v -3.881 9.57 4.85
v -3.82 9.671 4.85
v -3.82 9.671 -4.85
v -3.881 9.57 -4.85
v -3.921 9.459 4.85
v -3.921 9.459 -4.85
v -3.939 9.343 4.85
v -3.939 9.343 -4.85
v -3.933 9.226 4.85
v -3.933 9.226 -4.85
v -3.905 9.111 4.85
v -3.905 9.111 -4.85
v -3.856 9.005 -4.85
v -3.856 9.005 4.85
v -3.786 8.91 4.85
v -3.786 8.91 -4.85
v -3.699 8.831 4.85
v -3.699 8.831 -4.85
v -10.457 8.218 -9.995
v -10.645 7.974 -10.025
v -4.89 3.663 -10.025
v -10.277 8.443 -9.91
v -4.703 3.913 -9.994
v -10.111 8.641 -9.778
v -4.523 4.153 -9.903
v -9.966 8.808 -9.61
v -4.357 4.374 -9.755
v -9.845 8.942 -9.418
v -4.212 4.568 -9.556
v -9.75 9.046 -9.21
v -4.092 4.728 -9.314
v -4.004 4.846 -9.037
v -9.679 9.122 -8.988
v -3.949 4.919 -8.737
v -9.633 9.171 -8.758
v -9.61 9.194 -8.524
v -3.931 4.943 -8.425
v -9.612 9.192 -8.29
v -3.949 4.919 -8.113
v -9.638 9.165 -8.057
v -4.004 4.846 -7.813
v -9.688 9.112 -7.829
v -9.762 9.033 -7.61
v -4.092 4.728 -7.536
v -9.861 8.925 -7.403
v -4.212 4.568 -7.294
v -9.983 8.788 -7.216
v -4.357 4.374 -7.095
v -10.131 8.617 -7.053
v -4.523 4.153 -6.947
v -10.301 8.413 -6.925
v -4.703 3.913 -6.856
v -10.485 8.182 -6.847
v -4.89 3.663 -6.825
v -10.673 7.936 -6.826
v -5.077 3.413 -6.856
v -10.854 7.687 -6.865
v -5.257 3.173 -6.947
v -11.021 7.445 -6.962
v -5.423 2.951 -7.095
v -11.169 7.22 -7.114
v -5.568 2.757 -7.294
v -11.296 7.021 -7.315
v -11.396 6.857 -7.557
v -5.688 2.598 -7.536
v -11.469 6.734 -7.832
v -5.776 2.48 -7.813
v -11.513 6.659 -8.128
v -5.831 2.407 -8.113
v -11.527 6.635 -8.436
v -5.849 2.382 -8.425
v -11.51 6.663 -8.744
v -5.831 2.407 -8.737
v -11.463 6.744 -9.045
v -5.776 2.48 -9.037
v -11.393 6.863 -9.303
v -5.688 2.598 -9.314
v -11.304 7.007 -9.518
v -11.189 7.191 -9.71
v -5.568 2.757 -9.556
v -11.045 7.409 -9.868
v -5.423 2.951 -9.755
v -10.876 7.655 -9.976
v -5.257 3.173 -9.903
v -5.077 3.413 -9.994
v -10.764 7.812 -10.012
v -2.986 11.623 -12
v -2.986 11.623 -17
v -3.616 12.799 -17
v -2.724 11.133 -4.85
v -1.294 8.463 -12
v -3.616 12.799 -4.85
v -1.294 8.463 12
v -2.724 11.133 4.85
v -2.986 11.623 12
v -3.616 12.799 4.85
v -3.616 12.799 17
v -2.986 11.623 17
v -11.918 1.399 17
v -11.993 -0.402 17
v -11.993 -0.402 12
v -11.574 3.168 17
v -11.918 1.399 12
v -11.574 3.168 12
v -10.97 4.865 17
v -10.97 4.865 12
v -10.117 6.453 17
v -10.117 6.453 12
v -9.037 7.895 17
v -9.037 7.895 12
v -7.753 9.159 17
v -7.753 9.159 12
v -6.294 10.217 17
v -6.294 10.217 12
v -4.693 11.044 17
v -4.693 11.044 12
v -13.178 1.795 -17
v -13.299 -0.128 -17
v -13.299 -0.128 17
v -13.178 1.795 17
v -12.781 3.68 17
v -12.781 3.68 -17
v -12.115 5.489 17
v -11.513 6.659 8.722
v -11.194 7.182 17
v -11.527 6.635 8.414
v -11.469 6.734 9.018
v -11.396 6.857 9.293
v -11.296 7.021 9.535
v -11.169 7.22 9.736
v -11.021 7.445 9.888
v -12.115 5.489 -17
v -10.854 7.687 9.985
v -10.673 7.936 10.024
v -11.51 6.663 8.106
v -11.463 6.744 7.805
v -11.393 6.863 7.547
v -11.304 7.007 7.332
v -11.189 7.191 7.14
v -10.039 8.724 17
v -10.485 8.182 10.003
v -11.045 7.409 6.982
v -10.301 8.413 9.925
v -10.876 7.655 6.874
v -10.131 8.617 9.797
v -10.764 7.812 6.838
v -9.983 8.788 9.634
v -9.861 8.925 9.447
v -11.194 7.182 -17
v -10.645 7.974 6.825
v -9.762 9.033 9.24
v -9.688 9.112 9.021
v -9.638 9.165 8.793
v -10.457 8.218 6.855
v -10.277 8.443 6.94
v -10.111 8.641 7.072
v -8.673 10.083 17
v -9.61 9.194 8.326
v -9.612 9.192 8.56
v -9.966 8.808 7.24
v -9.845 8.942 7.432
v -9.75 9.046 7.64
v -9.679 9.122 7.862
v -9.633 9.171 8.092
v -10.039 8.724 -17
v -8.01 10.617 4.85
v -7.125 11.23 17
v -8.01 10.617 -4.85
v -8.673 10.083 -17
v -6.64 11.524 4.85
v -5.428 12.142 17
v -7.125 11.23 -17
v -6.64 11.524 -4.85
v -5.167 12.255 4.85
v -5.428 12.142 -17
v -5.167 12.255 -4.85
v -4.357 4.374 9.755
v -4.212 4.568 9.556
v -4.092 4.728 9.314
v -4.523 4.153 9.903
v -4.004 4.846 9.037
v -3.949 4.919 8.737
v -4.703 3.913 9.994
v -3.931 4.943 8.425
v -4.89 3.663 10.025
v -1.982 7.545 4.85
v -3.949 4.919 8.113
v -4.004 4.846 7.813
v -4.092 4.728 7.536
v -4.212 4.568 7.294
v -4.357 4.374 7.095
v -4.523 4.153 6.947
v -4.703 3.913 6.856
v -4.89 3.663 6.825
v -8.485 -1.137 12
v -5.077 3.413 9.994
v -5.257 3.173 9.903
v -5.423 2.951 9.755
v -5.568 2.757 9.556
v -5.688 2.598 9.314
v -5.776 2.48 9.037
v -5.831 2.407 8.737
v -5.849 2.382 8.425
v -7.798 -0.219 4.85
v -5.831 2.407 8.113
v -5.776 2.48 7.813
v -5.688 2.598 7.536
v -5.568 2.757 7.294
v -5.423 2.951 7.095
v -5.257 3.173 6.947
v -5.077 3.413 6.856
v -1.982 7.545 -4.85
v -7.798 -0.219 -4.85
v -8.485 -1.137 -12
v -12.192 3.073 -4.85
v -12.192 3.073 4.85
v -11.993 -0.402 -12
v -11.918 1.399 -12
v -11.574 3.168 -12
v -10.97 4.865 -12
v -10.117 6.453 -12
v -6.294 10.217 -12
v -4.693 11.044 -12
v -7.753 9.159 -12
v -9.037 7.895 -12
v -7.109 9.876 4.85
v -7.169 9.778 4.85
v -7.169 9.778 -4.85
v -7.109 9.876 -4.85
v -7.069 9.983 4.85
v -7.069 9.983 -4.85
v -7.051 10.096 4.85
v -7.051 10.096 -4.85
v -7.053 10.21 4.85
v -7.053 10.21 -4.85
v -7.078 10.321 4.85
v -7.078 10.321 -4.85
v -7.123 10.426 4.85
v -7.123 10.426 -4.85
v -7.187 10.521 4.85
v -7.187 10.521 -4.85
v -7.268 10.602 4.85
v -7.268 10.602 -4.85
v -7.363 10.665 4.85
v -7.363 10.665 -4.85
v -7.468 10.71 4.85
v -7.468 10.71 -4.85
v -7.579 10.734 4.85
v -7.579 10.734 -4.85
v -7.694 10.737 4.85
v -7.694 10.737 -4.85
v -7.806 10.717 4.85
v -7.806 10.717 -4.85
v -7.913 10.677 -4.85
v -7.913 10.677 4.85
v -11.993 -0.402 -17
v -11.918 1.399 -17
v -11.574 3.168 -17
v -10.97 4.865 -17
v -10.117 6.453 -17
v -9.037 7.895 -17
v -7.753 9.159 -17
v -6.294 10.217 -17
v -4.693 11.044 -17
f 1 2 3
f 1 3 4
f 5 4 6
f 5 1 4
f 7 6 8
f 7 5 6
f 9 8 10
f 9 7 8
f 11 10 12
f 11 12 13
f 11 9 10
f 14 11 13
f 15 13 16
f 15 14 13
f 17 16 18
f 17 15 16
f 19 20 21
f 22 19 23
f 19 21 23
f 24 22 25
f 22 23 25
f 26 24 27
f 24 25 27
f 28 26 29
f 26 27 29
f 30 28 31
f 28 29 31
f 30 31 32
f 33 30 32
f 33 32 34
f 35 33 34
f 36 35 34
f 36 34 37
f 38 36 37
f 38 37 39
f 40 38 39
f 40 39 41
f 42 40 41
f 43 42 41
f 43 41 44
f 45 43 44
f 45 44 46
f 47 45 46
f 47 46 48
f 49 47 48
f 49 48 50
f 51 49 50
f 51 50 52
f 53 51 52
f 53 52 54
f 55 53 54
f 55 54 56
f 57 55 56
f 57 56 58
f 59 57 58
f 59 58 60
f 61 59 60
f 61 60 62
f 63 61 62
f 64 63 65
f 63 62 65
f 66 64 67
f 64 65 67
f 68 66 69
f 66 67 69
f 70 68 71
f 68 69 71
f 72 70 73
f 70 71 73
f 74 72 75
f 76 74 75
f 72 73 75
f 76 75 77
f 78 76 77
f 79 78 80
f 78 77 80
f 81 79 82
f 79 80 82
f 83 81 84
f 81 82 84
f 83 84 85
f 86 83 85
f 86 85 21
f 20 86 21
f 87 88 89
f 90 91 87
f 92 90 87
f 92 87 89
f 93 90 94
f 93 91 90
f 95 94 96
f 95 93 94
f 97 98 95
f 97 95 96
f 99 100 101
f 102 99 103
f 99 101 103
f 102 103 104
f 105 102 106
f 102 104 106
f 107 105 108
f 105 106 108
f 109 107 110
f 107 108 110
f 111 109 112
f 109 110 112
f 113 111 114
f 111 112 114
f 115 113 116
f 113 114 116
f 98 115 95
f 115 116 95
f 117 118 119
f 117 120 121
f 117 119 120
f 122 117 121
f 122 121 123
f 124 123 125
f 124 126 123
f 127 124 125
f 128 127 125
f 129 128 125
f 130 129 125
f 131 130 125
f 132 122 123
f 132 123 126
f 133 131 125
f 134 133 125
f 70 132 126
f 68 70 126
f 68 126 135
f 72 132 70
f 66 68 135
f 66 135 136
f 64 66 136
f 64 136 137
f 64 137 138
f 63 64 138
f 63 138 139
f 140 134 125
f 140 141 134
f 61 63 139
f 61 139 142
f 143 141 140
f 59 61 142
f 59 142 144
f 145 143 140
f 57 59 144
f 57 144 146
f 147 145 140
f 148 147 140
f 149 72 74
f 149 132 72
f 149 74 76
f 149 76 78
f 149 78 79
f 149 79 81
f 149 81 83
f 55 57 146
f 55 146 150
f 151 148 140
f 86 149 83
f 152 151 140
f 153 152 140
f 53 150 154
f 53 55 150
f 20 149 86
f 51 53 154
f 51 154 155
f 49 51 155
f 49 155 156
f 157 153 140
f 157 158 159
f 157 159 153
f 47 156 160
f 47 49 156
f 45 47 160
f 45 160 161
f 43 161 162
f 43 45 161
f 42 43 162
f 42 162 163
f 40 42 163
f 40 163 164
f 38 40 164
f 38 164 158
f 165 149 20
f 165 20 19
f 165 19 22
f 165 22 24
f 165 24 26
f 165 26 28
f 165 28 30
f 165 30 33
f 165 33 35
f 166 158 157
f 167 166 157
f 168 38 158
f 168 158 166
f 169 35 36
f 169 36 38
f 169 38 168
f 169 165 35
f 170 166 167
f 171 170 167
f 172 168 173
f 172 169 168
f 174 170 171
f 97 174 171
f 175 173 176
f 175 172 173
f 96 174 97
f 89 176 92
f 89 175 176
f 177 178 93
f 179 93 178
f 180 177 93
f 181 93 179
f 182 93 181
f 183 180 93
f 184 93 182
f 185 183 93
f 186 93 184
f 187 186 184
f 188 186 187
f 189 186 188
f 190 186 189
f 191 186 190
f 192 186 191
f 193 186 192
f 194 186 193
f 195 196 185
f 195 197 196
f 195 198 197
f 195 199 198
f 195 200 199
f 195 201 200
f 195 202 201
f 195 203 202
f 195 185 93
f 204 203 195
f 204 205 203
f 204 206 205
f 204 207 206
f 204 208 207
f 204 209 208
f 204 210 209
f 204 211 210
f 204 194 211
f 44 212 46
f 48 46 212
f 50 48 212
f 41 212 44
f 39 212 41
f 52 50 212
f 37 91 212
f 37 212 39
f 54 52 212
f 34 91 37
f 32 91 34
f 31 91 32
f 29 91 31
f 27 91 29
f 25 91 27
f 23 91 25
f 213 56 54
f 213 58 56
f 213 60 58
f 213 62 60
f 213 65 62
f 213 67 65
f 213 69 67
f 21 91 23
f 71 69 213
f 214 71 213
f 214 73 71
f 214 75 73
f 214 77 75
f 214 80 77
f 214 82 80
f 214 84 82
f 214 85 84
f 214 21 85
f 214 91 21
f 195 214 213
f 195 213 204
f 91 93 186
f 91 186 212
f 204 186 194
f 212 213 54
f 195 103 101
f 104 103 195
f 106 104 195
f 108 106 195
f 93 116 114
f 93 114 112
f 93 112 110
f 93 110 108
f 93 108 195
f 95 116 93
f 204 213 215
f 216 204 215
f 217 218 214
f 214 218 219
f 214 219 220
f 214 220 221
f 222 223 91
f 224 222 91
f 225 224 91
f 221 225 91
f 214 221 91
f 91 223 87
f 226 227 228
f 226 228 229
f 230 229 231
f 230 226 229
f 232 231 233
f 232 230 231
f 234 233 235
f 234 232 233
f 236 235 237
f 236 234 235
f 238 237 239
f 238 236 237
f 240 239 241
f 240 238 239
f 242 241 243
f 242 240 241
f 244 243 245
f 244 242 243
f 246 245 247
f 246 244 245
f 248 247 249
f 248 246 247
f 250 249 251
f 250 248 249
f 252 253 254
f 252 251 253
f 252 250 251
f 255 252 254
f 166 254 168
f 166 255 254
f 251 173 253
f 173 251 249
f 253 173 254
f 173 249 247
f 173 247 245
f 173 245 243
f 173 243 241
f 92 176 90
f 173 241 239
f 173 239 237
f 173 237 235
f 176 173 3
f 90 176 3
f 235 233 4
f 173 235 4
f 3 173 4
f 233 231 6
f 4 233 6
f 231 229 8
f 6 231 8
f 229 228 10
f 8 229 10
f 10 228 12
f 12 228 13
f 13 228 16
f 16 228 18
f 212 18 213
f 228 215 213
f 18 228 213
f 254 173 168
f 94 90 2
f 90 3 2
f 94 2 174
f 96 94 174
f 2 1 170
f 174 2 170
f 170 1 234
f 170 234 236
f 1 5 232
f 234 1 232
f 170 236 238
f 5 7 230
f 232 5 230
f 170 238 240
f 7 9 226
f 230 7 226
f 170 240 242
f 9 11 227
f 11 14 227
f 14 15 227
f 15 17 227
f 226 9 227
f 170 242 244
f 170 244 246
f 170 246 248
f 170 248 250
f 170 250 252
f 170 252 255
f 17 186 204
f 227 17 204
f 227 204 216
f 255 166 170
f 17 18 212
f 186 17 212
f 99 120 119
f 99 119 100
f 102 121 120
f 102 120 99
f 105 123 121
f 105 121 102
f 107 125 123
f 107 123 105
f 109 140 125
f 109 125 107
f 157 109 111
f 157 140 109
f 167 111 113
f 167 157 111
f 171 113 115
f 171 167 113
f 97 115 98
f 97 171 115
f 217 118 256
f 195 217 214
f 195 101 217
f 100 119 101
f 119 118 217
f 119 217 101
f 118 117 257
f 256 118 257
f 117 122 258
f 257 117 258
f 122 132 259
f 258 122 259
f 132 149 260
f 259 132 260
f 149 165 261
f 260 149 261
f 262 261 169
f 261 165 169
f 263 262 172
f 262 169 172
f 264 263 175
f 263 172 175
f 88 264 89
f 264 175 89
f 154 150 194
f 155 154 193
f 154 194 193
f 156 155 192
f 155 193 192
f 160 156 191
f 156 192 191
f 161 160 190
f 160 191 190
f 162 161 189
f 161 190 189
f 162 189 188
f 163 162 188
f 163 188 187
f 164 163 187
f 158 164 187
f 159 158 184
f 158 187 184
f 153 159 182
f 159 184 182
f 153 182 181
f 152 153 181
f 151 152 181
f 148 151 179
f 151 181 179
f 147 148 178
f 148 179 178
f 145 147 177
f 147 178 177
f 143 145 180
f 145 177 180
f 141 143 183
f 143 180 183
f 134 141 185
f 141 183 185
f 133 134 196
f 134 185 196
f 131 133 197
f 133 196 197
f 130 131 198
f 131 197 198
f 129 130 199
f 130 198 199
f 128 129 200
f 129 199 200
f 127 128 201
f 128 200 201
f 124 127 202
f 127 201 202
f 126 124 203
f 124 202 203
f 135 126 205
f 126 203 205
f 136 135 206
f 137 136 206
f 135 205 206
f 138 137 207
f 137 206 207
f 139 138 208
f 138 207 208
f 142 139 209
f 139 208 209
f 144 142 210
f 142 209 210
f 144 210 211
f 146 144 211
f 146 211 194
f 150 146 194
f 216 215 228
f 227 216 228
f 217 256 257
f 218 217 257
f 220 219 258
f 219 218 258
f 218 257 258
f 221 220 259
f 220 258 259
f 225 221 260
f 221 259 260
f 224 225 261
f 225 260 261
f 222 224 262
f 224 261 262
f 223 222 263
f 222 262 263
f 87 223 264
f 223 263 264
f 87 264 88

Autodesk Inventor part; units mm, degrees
ref_plane "YZ Plane" through (0, 0, 0) normal (1, 0, 0) x (0, 1, 0)
ref_plane "XZ Plane" through (0, 0, 0) normal (0, 1, 0) x (-1, 0, 0)
ref_plane "XY Plane" through (0, 0, 0) normal (0, 0, 1) x (1, 0, 0)
sketch "Эскиз1" plane through (0, 0, 0) normal (0, 0, 1) x (1, 0, 0)
  arc A0 (-0.8919, 11.7662) -> (-11.5424, -2.4521) centre (0, 0) ccw projected
  line L0 (-0.016, 10.1696) -> (-9.7639, -2.8438) projected
  line L1 (-9.7639, -2.8438) -> (-12.4663, -6.4515) projected
  arc A1 (-0.8919, 11.7662) -> (-11.5424, -2.4521) centre (0, 0) ccw projected
  line L2 (2.8533, 14) -> (-0.016, 10.1696) projected
  arc A2 (-8.5159, 10.4752) -> (-12.3517, -5.4484) centre (0, 0) ccw projected
  circle A3 centre (0, 0) radius 13.5
  circle A4 centre (0, 0) radius 11.8
  circle A5 centre (0, 0) radius 13.3
  circle A6 centre (0, 0) radius 12
  line L3 (-8.1467, 14) -> (2.8533, 14) projected
  line L4 (-8.1467, 14) -> (-8.1467, 11.2511) projected
  arc A7 (-11.5424, -2.4521) -> (-9.7639, -2.8438) centre (-10.5642, -2.2443) ccw projected
  arc A8 (-0.016, 10.1696) -> (-0.8919, 11.7662) centre (-0.8163, 10.7691) ccw projected
  arc A9 (-8.5159, 10.4752) -> (-8.1467, 11.2511) centre (-9.1467, 11.2511) ccw projected
  arc A10 (-12.4663, -6.4515) -> (-12.3517, -5.4484) centre (-13.2667, -5.852) ccw projected
  arc A11 (-11.5424, -2.4521) -> (-9.7639, -2.8438) centre (-10.5642, -2.2443) ccw projected
  arc A12 (-0.016, 10.1696) -> (-0.8919, 11.7662) centre (-0.8163, 10.7691) ccw projected
  point P0 (1.1623, 11.7426)
  point P1 (2.3273, 13.2979)
  point P2 (-11.0819, -4.6034)
  point P3 (1.302, 11.9292)
  point P4 (2.1926, 13.118)
  point P5 (-11.9725, -5.7923)
  dimension "d1" = 0.2
  dimension "d2" = 0.2
extrude "Выдавливание1" add sketch "Эскиз1" along normal mid plane 34 contours A6 L1 A5 L2 picked at (-9.9488, 8.0267)
sketch "Эскиз2" plane through (0, 0, 0) normal (0, 0, 1) x (1, 0, 0)
  arc A0 (-0.8919, 11.7662) -> (-11.5424, -2.4521) centre (0, 0) ccw projected
  line L0 (-0.016, 10.1696) -> (-9.7639, -2.8438) projected
  arc A1 (1.302, 11.9292) -> (-11.0819, -4.6034) centre (0, 0) ccw projected
  line L1 (-14.5944, -9.2926) -> (2.8533, 14) projected
  arc A2 (-11.5424, -2.4521) -> (-9.7639, -2.8438) centre (-10.5642, -2.2443) ccw projected
  arc A3 (-0.016, 10.1696) -> (-0.8919, 11.7662) centre (-0.8163, 10.7691) ccw projected
  point P0 (1.1623, 11.7426)
  point P1 (-10.9422, -4.4168)
extrude "Выдавливание2" add sketch "Эскиз2" along normal mid plane 24
sketch "Эскиз3" plane through (0, 0, 0) normal (0, 0, 1) x (1, 0, 0)
  arc A0 (1.302, 11.9292) -> (-11.0819, -4.6034) centre (0, 0) ccw projected
  line L0 (-11.0819, -4.6034) -> (1.302, 11.9292) projected
  arc A1 (2.1926, 13.118) -> (-11.9725, -5.7923) centre (0, 0) ccw projected
  arc A2 (-8.5159, 10.4752) -> (-12.3517, -5.4484) centre (0, 0) ccw projected
  line L1 (1.302, 11.9292) -> (-11.0819, -4.6034) projected
  line L2 (-4.8899, 3.6629) -> (-10.8048, 8.0935)
  line L3 (-10.8048, 8.0935) -> (-8.8039, 6.5947)
  line L4 (-11.3519, 3.1932) -> (-6.256, 9.9963)
  line L5 (-6.256, 9.9963) -> (-2.2942, 7.0286)
  line L6 (-2.2942, 7.0286) -> (-7.3901, 0.2256)
  line L7 (-7.3901, 0.2256) -> (-11.3519, 3.1932)
  line L8 (-12.1918, 3.0727) -> (-6.3765, 10.8362)
  line L9 (-6.3765, 10.8362) -> (-1.4543, 7.1491)
  line L10 (-1.4543, 7.1491) -> (-7.2696, -0.6143)
  line L11 (-7.2696, -0.6143) -> (-12.1918, 3.0727)
  point P0 (-4.8422, 3.6271)
  dimension "d7" = 2.5
  dimension "d8" = 8.5
  dimension "d9" = 4.95
  dimension "d12" = 0.6
  dimension "d13" = 9.7
extrude "Выдавливание3" cut sketch "Эскиз3" along normal mid plane 9.7 contours L9 L0 L5 L4 L2 L8 A0 | A0 L8 L9 | L9 L10 L11 L0 L7 L6 L5 | L5 L6 L7 L0 | L0 L2 L4 L5 | L2 L4 L7 L0 L11 A0 L8 | L0 L7 L4 L2 | A0 L11 L8
sketch "Эскиз4" plane through (-1.9823, 7.5446, -4.85) normal (-0.5995217, -0.8003585, 0) x (0.8003585, -0.5995217, 0)
  line L0 (0, 9.7) -> (0, 0) projected
  line L1 (0, 9.7) -> (-5.4903, 9.7) projected
  line L2 (-5.4903, 0) -> (-5.4903, 9.7) projected
  line L3 (-5.4903, 0) -> (0, 0) projected
  line L4 (-5.4903, 9.7) -> (-2.7452, 9.7)
  line L5 (-2.7452, 0) -> (-2.7452, 9.7)
  point P0 (6.1097, 4.85)
extrude "Выдавливание4" cut sketch "Эскиз4" against normal blind 9.7 contours L5 L3 L2 L1
fillet "Сопряжение1" radius 0.6 3 edges at (-5.3836, 12.1617, 0) (-4.1794, 9.1904, 0) (-1.1375, 13.2513, 0)
sketch "Эскиз5" plane through (0, 0, 17) normal (0, 0, 1) x (1, 0, 0)
  arc A0 (2.1926, 13.118) -> (-11.9725, -5.7923) centre (0, 0) ccw projected
  circle A1 centre (0, 0) radius 13.3
  line L0 (2.8533, 17.048) -> (2.8533, 14) projected
  circle A2 centre (0, 0) radius 2.8533
  line L1 (9.8804, -12.4095) -> (-5.8229, 16.921)
  line L2 (0, 0) -> (2.5154, 1.3467)
  line L3 (-19.8346, 1.2413) -> (17.8745, -6.661)
  line L4 (0, 0) -> (-0.5852, -2.7926)
  line L5 (0, 0) -> (-4.8899, 3.6629)
  line L6 (-1.9823, 7.5446) -> (-7.7976, -0.2189) projected
  point P0 (5.4035, -4.0476)
  point P1 (-13.2994, -0.1282)
  point P2 (-11.9725, -5.7923)
  point P3 (8.6469, -10.1055)
  point P4 (12.1289, -5.457)
  point P5 (-3.6161, 12.799)
  dimension "d19" = 115
  dimension "d20" = 115
extrude "Выдавливание5" cut sketch "Эскиз5" against normal blind 40 contours A1 L3 L1 A0 | L3 L1 A1 A0
sketch "Эскиз6" plane through (-8.4854, -1.137, 12) normal (0.8003585, -0.5995217, 0) x (0, 0, -1)
  line L0 (0, 0) -> (24, 0) projected
  line L1 (24, 11.9944) -> (24, 0) projected
  line L2 (24, 11.9944) -> (0, 11.9944) projected
  line L3 (0, 0) -> (0, 11.9944) projected
  line L4 (16.85, 10.8472) -> (16.85, 1.1472) projected
  line L5 (16.85, 1.1472) -> (7.15, 1.1472) projected
  line L6 (7.15, 1.1472) -> (7.15, 10.8472) projected
  line L7 (7.15, 10.8472) -> (16.85, 10.8472) projected
  line L8 (0, 0) -> (0, 11.9944) projected
  line L9 (0, 5.9972) -> (7.15, 5.9972)
  line L10 (7.15, 1.1472) -> (7.15, 10.8472) projected
  line L11 (16.85, 1.1472) -> (16.85, 9.5257) projected
  line L12 (16.85, 5.9972) -> (24, 5.9972)
  circle A0 centre (3.575, 5.9972) radius 1.6
  circle A1 centre (20.425, 5.9972) radius 1.6
  point P0 (12, 5.9972)
  dimension "d23" = 3.2
  dimension "d24" = 3.2
extrude "Выдавливание6" cut sketch "Эскиз6" against normal blind 40 contours A0 L9 | L9 A0 | A1 L12 | L12 A1
properties part number "camera fixator2"
